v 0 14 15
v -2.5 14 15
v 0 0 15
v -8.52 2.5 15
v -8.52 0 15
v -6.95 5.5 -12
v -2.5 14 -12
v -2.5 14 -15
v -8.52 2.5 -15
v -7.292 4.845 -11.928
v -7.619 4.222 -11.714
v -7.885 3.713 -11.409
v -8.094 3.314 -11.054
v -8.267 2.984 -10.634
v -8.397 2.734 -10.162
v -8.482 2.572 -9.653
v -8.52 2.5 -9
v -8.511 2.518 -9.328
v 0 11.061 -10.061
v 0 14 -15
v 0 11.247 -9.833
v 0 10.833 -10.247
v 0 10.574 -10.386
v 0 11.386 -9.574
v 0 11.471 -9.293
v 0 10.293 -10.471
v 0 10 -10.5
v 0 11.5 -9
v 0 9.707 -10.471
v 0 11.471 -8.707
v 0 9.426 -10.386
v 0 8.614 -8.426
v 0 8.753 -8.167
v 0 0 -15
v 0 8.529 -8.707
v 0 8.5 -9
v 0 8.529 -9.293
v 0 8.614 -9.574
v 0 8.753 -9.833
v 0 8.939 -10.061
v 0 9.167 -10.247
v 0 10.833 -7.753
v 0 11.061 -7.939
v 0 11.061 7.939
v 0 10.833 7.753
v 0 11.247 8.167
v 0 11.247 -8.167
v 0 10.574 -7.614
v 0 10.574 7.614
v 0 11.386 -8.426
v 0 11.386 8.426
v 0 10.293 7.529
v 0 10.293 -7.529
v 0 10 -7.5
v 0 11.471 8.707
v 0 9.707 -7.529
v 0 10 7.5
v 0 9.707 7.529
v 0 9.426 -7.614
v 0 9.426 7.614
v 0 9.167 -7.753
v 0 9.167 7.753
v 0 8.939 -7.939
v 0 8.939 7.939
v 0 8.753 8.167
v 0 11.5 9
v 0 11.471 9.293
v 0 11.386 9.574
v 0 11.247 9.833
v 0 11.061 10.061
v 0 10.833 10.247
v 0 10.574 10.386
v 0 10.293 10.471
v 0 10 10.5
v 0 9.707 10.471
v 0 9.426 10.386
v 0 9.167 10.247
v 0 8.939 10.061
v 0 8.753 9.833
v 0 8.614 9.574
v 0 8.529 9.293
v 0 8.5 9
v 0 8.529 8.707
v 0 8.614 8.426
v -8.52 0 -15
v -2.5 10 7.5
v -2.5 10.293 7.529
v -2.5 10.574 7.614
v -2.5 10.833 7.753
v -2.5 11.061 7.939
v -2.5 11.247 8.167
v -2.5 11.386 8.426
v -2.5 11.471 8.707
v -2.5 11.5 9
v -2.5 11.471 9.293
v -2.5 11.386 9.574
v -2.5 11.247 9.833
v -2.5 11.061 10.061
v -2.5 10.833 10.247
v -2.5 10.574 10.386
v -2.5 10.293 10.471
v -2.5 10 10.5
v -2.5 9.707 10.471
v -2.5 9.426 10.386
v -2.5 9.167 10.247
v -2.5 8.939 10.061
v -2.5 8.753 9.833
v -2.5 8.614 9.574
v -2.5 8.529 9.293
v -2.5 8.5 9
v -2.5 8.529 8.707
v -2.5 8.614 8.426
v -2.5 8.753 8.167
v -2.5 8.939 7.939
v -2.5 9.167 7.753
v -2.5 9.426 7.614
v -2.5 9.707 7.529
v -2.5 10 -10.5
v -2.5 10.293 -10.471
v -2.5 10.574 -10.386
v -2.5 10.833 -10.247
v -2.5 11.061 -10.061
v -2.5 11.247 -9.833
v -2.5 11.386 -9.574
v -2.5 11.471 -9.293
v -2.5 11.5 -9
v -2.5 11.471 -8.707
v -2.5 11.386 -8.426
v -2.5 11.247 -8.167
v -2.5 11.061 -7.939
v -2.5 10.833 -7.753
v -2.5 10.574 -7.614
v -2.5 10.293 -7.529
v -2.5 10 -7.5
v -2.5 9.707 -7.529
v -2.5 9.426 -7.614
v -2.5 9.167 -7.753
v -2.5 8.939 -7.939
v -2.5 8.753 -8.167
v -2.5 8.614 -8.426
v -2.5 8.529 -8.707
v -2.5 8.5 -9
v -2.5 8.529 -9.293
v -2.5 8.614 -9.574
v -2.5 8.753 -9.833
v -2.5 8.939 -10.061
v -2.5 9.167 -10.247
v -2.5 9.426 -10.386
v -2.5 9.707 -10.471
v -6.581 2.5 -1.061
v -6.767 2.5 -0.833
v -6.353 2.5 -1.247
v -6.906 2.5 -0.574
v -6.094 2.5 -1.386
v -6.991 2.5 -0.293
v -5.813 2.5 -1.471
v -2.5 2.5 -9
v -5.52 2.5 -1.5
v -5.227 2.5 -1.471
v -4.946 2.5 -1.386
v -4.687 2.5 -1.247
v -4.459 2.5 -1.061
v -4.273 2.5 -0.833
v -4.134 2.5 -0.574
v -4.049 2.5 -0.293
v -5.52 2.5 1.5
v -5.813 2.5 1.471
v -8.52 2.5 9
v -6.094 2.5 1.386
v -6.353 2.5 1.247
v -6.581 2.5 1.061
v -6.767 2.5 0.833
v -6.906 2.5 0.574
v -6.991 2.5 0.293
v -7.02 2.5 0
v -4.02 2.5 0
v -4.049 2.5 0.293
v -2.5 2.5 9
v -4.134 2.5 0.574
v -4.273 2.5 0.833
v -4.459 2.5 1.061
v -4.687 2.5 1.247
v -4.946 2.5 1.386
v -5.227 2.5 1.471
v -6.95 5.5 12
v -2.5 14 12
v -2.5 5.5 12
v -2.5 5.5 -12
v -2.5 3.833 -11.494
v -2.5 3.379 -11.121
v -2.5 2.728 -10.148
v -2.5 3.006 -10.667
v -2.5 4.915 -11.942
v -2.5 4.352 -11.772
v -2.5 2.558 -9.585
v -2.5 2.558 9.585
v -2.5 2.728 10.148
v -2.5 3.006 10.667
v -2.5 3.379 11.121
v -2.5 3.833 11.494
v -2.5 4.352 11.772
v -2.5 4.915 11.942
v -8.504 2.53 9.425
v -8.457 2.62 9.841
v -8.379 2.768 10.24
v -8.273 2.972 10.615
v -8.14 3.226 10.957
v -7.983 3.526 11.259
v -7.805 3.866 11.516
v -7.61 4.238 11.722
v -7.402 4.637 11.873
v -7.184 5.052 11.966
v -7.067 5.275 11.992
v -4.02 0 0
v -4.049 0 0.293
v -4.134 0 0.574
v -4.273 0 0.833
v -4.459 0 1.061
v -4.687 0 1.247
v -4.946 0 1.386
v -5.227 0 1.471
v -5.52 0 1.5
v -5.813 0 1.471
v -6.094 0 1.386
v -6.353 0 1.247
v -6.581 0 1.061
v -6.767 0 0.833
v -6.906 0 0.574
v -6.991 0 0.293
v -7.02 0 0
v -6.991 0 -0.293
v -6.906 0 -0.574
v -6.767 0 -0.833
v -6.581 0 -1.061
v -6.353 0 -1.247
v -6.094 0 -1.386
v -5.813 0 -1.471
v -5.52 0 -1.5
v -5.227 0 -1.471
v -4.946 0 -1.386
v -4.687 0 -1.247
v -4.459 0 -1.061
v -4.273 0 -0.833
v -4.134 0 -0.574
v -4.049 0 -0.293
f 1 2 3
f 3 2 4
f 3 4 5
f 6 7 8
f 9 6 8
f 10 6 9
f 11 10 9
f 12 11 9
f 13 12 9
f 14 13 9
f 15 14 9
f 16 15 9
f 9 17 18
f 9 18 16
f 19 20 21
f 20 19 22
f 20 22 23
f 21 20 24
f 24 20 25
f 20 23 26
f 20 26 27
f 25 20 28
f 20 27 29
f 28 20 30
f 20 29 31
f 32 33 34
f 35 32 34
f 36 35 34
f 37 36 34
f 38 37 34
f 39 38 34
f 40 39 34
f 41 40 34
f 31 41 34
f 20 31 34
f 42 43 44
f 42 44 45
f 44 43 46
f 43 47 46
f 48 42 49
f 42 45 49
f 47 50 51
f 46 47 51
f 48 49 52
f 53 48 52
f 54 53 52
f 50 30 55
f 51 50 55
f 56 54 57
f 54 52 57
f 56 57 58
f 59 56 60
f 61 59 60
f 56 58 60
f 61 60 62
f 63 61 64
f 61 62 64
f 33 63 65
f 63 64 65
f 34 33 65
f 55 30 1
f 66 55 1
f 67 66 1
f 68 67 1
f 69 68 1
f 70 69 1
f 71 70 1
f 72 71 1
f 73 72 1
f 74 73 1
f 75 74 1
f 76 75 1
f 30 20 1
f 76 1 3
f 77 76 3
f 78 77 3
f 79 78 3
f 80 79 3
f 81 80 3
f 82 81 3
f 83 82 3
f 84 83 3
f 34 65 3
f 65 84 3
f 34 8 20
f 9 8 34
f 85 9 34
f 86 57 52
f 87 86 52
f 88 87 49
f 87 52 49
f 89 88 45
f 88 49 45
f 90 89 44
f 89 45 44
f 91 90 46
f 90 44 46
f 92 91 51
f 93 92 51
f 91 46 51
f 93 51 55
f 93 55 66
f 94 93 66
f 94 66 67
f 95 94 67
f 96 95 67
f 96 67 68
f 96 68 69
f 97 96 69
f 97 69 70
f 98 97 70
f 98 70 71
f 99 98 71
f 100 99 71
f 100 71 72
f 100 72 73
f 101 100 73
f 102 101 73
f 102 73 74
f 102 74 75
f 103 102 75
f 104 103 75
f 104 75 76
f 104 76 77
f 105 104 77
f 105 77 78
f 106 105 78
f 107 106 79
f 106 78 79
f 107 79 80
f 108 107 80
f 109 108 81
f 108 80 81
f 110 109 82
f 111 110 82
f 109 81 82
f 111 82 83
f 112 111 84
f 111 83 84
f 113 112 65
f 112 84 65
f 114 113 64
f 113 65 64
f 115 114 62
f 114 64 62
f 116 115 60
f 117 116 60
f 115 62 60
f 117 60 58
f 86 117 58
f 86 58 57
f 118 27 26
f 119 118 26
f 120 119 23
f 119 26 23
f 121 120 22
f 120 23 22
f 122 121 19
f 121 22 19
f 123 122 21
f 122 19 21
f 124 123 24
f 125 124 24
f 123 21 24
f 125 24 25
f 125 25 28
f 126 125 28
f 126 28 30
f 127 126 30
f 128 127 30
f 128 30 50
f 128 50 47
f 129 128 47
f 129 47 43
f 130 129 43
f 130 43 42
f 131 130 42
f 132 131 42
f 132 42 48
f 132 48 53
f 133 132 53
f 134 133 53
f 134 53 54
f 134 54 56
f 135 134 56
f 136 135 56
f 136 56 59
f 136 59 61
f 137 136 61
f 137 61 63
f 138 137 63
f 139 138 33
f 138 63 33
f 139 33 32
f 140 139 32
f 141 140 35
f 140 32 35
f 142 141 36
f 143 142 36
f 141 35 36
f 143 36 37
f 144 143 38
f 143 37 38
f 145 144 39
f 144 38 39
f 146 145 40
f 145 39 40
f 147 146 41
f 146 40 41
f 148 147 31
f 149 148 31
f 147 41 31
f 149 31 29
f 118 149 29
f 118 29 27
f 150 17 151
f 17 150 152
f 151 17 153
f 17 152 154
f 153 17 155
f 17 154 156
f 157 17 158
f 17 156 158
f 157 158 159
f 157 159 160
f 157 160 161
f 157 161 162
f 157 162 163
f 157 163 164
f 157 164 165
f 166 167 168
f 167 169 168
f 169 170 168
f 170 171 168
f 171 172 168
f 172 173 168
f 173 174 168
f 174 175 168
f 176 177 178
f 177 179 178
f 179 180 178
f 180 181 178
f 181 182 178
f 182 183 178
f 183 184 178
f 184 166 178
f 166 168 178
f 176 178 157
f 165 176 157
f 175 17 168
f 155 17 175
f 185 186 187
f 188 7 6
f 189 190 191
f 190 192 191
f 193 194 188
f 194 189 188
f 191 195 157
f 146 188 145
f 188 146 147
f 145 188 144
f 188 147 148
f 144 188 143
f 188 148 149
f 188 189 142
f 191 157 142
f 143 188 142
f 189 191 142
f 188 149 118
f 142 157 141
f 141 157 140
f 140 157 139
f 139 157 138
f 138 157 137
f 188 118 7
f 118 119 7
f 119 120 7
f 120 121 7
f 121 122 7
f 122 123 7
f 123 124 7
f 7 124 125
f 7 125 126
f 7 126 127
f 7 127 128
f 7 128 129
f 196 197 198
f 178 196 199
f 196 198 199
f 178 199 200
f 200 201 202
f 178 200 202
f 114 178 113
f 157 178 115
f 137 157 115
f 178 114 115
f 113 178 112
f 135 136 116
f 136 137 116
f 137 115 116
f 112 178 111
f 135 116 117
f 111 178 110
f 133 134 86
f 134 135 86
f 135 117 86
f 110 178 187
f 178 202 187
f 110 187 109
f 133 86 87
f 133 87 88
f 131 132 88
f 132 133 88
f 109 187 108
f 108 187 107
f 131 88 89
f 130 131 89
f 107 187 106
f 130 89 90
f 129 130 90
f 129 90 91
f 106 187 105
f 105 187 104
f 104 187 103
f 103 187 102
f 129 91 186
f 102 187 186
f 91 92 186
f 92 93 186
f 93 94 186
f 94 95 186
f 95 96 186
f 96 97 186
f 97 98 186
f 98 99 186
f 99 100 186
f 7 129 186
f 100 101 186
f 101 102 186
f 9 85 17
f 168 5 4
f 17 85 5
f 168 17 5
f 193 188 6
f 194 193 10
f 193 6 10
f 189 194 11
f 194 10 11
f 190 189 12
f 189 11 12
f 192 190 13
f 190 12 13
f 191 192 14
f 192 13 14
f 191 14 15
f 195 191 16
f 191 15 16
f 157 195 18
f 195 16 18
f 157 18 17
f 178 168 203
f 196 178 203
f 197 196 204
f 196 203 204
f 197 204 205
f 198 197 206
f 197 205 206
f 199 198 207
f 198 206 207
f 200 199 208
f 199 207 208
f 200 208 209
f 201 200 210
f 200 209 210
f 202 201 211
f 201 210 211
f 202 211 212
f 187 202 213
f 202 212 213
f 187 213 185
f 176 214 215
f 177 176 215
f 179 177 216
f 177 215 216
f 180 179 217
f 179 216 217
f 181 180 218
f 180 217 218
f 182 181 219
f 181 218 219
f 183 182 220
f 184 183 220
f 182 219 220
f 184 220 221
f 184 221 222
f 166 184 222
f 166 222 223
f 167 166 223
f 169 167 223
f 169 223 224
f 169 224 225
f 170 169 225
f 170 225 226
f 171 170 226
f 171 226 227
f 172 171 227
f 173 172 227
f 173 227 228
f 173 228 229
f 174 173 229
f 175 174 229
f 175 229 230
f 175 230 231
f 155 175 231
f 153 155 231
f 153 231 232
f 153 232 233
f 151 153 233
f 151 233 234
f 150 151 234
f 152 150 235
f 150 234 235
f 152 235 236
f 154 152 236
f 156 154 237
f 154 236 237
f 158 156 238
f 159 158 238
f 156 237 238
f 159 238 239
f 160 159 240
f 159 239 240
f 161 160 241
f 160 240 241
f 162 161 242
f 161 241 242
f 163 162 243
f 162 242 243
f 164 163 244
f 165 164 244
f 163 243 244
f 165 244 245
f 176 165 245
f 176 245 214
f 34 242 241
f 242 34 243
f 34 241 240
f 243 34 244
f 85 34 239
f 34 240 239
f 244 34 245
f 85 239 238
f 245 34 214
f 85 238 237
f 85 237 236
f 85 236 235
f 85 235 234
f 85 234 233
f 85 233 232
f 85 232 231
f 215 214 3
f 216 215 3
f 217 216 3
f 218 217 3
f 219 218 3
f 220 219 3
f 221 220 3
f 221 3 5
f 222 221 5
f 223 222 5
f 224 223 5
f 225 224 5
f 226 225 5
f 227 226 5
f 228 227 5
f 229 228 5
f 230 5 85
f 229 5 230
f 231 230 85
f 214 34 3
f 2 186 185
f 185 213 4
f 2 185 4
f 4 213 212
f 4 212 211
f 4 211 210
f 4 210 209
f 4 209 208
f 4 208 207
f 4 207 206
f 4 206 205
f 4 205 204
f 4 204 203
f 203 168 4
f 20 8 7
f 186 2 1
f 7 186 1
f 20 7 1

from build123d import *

# Parameters (mm, degrees)
EXTRUDE_1_DEPTH     = 15
SKETCH_3_R          = 1.5
CUT_EXTRUDE_1_DEPTH = 23.216894472
RIB_1_REACH         = 36.185
SKETCH_4_WALL_W     = 83.349688256
SKETCH_4_WALL_H     = 3
SKETCH_5_R          = 1.5
CUT_EXTRUDE_2_DEPTH = 23.216894472
FILLET_1_R          = 3


with BuildPart() as part:
    # 草图2 → 拉伸-薄壁1 (new, symmetric)
    with BuildSketch(Plane.XY):
        Polygon((0, 14), (0, 0), (-8.52, 0), (-8.52, 2.5), (-2.5, 2.5), (-2.5, 14), align=None)
    extrude(amount=EXTRUDE_1_DEPTH, both=True)

    # 草图3 → 切除-拉伸1 (cut, through all)
    with BuildSketch(Plane.XZ):
        with Locations((-5.52, 0)):
            Circle(SKETCH_3_R)
    extrude(amount=-CUT_EXTRUDE_1_DEPTH, mode=Mode.SUBTRACT)

    # 草图4 wall → 筋1 (add, up to next)
    with BuildSketch(Plane(origin=(-5.51, 8.25, 15), x_dir=(-0.463776683525, -0.885952136302, 0), z_dir=(0.885952136302, -0.463776683525, 0)), mode=Mode.PRIVATE) as rib_1_sk1:
        with Locations((0, 1.5)):
            Rectangle(SKETCH_4_WALL_W, SKETCH_4_WALL_H)
    rib_1_tool1 = extrude(rib_1_sk1.sketch, amount=RIB_1_REACH, mode=Mode.PRIVATE) - part.part
    rib_1 = rib_1_tool1.solids().sort_by_distance((-5.51, 8.25, 15))[0]
    add(rib_1)

    # 镜向1: 筋1 across plane
    add(rib_1.mirror(Plane.XY))

    # 草图5 → 切除-拉伸2 (cut, through all)
    with BuildSketch(Plane(origin=(0, 0, 0), x_dir=(0, 0, -1), z_dir=(1, 0, 0))):
        with Locations((-9, 10)):
            Circle(SKETCH_5_R)
        with Locations((9, 10)):
            Circle(SKETCH_5_R)
    extrude(amount=-CUT_EXTRUDE_2_DEPTH, mode=Mode.SUBTRACT)

    # 圆角1
    fillet_1_edges = [part.edges().sort_by_distance(p)[0] for p in [
        (-5.51, 2.5, 12),
        (-5.51, 2.5, -12),
    ]]
    fillet(fillet_1_edges, radius=FILLET_1_R)


solid = part.part
